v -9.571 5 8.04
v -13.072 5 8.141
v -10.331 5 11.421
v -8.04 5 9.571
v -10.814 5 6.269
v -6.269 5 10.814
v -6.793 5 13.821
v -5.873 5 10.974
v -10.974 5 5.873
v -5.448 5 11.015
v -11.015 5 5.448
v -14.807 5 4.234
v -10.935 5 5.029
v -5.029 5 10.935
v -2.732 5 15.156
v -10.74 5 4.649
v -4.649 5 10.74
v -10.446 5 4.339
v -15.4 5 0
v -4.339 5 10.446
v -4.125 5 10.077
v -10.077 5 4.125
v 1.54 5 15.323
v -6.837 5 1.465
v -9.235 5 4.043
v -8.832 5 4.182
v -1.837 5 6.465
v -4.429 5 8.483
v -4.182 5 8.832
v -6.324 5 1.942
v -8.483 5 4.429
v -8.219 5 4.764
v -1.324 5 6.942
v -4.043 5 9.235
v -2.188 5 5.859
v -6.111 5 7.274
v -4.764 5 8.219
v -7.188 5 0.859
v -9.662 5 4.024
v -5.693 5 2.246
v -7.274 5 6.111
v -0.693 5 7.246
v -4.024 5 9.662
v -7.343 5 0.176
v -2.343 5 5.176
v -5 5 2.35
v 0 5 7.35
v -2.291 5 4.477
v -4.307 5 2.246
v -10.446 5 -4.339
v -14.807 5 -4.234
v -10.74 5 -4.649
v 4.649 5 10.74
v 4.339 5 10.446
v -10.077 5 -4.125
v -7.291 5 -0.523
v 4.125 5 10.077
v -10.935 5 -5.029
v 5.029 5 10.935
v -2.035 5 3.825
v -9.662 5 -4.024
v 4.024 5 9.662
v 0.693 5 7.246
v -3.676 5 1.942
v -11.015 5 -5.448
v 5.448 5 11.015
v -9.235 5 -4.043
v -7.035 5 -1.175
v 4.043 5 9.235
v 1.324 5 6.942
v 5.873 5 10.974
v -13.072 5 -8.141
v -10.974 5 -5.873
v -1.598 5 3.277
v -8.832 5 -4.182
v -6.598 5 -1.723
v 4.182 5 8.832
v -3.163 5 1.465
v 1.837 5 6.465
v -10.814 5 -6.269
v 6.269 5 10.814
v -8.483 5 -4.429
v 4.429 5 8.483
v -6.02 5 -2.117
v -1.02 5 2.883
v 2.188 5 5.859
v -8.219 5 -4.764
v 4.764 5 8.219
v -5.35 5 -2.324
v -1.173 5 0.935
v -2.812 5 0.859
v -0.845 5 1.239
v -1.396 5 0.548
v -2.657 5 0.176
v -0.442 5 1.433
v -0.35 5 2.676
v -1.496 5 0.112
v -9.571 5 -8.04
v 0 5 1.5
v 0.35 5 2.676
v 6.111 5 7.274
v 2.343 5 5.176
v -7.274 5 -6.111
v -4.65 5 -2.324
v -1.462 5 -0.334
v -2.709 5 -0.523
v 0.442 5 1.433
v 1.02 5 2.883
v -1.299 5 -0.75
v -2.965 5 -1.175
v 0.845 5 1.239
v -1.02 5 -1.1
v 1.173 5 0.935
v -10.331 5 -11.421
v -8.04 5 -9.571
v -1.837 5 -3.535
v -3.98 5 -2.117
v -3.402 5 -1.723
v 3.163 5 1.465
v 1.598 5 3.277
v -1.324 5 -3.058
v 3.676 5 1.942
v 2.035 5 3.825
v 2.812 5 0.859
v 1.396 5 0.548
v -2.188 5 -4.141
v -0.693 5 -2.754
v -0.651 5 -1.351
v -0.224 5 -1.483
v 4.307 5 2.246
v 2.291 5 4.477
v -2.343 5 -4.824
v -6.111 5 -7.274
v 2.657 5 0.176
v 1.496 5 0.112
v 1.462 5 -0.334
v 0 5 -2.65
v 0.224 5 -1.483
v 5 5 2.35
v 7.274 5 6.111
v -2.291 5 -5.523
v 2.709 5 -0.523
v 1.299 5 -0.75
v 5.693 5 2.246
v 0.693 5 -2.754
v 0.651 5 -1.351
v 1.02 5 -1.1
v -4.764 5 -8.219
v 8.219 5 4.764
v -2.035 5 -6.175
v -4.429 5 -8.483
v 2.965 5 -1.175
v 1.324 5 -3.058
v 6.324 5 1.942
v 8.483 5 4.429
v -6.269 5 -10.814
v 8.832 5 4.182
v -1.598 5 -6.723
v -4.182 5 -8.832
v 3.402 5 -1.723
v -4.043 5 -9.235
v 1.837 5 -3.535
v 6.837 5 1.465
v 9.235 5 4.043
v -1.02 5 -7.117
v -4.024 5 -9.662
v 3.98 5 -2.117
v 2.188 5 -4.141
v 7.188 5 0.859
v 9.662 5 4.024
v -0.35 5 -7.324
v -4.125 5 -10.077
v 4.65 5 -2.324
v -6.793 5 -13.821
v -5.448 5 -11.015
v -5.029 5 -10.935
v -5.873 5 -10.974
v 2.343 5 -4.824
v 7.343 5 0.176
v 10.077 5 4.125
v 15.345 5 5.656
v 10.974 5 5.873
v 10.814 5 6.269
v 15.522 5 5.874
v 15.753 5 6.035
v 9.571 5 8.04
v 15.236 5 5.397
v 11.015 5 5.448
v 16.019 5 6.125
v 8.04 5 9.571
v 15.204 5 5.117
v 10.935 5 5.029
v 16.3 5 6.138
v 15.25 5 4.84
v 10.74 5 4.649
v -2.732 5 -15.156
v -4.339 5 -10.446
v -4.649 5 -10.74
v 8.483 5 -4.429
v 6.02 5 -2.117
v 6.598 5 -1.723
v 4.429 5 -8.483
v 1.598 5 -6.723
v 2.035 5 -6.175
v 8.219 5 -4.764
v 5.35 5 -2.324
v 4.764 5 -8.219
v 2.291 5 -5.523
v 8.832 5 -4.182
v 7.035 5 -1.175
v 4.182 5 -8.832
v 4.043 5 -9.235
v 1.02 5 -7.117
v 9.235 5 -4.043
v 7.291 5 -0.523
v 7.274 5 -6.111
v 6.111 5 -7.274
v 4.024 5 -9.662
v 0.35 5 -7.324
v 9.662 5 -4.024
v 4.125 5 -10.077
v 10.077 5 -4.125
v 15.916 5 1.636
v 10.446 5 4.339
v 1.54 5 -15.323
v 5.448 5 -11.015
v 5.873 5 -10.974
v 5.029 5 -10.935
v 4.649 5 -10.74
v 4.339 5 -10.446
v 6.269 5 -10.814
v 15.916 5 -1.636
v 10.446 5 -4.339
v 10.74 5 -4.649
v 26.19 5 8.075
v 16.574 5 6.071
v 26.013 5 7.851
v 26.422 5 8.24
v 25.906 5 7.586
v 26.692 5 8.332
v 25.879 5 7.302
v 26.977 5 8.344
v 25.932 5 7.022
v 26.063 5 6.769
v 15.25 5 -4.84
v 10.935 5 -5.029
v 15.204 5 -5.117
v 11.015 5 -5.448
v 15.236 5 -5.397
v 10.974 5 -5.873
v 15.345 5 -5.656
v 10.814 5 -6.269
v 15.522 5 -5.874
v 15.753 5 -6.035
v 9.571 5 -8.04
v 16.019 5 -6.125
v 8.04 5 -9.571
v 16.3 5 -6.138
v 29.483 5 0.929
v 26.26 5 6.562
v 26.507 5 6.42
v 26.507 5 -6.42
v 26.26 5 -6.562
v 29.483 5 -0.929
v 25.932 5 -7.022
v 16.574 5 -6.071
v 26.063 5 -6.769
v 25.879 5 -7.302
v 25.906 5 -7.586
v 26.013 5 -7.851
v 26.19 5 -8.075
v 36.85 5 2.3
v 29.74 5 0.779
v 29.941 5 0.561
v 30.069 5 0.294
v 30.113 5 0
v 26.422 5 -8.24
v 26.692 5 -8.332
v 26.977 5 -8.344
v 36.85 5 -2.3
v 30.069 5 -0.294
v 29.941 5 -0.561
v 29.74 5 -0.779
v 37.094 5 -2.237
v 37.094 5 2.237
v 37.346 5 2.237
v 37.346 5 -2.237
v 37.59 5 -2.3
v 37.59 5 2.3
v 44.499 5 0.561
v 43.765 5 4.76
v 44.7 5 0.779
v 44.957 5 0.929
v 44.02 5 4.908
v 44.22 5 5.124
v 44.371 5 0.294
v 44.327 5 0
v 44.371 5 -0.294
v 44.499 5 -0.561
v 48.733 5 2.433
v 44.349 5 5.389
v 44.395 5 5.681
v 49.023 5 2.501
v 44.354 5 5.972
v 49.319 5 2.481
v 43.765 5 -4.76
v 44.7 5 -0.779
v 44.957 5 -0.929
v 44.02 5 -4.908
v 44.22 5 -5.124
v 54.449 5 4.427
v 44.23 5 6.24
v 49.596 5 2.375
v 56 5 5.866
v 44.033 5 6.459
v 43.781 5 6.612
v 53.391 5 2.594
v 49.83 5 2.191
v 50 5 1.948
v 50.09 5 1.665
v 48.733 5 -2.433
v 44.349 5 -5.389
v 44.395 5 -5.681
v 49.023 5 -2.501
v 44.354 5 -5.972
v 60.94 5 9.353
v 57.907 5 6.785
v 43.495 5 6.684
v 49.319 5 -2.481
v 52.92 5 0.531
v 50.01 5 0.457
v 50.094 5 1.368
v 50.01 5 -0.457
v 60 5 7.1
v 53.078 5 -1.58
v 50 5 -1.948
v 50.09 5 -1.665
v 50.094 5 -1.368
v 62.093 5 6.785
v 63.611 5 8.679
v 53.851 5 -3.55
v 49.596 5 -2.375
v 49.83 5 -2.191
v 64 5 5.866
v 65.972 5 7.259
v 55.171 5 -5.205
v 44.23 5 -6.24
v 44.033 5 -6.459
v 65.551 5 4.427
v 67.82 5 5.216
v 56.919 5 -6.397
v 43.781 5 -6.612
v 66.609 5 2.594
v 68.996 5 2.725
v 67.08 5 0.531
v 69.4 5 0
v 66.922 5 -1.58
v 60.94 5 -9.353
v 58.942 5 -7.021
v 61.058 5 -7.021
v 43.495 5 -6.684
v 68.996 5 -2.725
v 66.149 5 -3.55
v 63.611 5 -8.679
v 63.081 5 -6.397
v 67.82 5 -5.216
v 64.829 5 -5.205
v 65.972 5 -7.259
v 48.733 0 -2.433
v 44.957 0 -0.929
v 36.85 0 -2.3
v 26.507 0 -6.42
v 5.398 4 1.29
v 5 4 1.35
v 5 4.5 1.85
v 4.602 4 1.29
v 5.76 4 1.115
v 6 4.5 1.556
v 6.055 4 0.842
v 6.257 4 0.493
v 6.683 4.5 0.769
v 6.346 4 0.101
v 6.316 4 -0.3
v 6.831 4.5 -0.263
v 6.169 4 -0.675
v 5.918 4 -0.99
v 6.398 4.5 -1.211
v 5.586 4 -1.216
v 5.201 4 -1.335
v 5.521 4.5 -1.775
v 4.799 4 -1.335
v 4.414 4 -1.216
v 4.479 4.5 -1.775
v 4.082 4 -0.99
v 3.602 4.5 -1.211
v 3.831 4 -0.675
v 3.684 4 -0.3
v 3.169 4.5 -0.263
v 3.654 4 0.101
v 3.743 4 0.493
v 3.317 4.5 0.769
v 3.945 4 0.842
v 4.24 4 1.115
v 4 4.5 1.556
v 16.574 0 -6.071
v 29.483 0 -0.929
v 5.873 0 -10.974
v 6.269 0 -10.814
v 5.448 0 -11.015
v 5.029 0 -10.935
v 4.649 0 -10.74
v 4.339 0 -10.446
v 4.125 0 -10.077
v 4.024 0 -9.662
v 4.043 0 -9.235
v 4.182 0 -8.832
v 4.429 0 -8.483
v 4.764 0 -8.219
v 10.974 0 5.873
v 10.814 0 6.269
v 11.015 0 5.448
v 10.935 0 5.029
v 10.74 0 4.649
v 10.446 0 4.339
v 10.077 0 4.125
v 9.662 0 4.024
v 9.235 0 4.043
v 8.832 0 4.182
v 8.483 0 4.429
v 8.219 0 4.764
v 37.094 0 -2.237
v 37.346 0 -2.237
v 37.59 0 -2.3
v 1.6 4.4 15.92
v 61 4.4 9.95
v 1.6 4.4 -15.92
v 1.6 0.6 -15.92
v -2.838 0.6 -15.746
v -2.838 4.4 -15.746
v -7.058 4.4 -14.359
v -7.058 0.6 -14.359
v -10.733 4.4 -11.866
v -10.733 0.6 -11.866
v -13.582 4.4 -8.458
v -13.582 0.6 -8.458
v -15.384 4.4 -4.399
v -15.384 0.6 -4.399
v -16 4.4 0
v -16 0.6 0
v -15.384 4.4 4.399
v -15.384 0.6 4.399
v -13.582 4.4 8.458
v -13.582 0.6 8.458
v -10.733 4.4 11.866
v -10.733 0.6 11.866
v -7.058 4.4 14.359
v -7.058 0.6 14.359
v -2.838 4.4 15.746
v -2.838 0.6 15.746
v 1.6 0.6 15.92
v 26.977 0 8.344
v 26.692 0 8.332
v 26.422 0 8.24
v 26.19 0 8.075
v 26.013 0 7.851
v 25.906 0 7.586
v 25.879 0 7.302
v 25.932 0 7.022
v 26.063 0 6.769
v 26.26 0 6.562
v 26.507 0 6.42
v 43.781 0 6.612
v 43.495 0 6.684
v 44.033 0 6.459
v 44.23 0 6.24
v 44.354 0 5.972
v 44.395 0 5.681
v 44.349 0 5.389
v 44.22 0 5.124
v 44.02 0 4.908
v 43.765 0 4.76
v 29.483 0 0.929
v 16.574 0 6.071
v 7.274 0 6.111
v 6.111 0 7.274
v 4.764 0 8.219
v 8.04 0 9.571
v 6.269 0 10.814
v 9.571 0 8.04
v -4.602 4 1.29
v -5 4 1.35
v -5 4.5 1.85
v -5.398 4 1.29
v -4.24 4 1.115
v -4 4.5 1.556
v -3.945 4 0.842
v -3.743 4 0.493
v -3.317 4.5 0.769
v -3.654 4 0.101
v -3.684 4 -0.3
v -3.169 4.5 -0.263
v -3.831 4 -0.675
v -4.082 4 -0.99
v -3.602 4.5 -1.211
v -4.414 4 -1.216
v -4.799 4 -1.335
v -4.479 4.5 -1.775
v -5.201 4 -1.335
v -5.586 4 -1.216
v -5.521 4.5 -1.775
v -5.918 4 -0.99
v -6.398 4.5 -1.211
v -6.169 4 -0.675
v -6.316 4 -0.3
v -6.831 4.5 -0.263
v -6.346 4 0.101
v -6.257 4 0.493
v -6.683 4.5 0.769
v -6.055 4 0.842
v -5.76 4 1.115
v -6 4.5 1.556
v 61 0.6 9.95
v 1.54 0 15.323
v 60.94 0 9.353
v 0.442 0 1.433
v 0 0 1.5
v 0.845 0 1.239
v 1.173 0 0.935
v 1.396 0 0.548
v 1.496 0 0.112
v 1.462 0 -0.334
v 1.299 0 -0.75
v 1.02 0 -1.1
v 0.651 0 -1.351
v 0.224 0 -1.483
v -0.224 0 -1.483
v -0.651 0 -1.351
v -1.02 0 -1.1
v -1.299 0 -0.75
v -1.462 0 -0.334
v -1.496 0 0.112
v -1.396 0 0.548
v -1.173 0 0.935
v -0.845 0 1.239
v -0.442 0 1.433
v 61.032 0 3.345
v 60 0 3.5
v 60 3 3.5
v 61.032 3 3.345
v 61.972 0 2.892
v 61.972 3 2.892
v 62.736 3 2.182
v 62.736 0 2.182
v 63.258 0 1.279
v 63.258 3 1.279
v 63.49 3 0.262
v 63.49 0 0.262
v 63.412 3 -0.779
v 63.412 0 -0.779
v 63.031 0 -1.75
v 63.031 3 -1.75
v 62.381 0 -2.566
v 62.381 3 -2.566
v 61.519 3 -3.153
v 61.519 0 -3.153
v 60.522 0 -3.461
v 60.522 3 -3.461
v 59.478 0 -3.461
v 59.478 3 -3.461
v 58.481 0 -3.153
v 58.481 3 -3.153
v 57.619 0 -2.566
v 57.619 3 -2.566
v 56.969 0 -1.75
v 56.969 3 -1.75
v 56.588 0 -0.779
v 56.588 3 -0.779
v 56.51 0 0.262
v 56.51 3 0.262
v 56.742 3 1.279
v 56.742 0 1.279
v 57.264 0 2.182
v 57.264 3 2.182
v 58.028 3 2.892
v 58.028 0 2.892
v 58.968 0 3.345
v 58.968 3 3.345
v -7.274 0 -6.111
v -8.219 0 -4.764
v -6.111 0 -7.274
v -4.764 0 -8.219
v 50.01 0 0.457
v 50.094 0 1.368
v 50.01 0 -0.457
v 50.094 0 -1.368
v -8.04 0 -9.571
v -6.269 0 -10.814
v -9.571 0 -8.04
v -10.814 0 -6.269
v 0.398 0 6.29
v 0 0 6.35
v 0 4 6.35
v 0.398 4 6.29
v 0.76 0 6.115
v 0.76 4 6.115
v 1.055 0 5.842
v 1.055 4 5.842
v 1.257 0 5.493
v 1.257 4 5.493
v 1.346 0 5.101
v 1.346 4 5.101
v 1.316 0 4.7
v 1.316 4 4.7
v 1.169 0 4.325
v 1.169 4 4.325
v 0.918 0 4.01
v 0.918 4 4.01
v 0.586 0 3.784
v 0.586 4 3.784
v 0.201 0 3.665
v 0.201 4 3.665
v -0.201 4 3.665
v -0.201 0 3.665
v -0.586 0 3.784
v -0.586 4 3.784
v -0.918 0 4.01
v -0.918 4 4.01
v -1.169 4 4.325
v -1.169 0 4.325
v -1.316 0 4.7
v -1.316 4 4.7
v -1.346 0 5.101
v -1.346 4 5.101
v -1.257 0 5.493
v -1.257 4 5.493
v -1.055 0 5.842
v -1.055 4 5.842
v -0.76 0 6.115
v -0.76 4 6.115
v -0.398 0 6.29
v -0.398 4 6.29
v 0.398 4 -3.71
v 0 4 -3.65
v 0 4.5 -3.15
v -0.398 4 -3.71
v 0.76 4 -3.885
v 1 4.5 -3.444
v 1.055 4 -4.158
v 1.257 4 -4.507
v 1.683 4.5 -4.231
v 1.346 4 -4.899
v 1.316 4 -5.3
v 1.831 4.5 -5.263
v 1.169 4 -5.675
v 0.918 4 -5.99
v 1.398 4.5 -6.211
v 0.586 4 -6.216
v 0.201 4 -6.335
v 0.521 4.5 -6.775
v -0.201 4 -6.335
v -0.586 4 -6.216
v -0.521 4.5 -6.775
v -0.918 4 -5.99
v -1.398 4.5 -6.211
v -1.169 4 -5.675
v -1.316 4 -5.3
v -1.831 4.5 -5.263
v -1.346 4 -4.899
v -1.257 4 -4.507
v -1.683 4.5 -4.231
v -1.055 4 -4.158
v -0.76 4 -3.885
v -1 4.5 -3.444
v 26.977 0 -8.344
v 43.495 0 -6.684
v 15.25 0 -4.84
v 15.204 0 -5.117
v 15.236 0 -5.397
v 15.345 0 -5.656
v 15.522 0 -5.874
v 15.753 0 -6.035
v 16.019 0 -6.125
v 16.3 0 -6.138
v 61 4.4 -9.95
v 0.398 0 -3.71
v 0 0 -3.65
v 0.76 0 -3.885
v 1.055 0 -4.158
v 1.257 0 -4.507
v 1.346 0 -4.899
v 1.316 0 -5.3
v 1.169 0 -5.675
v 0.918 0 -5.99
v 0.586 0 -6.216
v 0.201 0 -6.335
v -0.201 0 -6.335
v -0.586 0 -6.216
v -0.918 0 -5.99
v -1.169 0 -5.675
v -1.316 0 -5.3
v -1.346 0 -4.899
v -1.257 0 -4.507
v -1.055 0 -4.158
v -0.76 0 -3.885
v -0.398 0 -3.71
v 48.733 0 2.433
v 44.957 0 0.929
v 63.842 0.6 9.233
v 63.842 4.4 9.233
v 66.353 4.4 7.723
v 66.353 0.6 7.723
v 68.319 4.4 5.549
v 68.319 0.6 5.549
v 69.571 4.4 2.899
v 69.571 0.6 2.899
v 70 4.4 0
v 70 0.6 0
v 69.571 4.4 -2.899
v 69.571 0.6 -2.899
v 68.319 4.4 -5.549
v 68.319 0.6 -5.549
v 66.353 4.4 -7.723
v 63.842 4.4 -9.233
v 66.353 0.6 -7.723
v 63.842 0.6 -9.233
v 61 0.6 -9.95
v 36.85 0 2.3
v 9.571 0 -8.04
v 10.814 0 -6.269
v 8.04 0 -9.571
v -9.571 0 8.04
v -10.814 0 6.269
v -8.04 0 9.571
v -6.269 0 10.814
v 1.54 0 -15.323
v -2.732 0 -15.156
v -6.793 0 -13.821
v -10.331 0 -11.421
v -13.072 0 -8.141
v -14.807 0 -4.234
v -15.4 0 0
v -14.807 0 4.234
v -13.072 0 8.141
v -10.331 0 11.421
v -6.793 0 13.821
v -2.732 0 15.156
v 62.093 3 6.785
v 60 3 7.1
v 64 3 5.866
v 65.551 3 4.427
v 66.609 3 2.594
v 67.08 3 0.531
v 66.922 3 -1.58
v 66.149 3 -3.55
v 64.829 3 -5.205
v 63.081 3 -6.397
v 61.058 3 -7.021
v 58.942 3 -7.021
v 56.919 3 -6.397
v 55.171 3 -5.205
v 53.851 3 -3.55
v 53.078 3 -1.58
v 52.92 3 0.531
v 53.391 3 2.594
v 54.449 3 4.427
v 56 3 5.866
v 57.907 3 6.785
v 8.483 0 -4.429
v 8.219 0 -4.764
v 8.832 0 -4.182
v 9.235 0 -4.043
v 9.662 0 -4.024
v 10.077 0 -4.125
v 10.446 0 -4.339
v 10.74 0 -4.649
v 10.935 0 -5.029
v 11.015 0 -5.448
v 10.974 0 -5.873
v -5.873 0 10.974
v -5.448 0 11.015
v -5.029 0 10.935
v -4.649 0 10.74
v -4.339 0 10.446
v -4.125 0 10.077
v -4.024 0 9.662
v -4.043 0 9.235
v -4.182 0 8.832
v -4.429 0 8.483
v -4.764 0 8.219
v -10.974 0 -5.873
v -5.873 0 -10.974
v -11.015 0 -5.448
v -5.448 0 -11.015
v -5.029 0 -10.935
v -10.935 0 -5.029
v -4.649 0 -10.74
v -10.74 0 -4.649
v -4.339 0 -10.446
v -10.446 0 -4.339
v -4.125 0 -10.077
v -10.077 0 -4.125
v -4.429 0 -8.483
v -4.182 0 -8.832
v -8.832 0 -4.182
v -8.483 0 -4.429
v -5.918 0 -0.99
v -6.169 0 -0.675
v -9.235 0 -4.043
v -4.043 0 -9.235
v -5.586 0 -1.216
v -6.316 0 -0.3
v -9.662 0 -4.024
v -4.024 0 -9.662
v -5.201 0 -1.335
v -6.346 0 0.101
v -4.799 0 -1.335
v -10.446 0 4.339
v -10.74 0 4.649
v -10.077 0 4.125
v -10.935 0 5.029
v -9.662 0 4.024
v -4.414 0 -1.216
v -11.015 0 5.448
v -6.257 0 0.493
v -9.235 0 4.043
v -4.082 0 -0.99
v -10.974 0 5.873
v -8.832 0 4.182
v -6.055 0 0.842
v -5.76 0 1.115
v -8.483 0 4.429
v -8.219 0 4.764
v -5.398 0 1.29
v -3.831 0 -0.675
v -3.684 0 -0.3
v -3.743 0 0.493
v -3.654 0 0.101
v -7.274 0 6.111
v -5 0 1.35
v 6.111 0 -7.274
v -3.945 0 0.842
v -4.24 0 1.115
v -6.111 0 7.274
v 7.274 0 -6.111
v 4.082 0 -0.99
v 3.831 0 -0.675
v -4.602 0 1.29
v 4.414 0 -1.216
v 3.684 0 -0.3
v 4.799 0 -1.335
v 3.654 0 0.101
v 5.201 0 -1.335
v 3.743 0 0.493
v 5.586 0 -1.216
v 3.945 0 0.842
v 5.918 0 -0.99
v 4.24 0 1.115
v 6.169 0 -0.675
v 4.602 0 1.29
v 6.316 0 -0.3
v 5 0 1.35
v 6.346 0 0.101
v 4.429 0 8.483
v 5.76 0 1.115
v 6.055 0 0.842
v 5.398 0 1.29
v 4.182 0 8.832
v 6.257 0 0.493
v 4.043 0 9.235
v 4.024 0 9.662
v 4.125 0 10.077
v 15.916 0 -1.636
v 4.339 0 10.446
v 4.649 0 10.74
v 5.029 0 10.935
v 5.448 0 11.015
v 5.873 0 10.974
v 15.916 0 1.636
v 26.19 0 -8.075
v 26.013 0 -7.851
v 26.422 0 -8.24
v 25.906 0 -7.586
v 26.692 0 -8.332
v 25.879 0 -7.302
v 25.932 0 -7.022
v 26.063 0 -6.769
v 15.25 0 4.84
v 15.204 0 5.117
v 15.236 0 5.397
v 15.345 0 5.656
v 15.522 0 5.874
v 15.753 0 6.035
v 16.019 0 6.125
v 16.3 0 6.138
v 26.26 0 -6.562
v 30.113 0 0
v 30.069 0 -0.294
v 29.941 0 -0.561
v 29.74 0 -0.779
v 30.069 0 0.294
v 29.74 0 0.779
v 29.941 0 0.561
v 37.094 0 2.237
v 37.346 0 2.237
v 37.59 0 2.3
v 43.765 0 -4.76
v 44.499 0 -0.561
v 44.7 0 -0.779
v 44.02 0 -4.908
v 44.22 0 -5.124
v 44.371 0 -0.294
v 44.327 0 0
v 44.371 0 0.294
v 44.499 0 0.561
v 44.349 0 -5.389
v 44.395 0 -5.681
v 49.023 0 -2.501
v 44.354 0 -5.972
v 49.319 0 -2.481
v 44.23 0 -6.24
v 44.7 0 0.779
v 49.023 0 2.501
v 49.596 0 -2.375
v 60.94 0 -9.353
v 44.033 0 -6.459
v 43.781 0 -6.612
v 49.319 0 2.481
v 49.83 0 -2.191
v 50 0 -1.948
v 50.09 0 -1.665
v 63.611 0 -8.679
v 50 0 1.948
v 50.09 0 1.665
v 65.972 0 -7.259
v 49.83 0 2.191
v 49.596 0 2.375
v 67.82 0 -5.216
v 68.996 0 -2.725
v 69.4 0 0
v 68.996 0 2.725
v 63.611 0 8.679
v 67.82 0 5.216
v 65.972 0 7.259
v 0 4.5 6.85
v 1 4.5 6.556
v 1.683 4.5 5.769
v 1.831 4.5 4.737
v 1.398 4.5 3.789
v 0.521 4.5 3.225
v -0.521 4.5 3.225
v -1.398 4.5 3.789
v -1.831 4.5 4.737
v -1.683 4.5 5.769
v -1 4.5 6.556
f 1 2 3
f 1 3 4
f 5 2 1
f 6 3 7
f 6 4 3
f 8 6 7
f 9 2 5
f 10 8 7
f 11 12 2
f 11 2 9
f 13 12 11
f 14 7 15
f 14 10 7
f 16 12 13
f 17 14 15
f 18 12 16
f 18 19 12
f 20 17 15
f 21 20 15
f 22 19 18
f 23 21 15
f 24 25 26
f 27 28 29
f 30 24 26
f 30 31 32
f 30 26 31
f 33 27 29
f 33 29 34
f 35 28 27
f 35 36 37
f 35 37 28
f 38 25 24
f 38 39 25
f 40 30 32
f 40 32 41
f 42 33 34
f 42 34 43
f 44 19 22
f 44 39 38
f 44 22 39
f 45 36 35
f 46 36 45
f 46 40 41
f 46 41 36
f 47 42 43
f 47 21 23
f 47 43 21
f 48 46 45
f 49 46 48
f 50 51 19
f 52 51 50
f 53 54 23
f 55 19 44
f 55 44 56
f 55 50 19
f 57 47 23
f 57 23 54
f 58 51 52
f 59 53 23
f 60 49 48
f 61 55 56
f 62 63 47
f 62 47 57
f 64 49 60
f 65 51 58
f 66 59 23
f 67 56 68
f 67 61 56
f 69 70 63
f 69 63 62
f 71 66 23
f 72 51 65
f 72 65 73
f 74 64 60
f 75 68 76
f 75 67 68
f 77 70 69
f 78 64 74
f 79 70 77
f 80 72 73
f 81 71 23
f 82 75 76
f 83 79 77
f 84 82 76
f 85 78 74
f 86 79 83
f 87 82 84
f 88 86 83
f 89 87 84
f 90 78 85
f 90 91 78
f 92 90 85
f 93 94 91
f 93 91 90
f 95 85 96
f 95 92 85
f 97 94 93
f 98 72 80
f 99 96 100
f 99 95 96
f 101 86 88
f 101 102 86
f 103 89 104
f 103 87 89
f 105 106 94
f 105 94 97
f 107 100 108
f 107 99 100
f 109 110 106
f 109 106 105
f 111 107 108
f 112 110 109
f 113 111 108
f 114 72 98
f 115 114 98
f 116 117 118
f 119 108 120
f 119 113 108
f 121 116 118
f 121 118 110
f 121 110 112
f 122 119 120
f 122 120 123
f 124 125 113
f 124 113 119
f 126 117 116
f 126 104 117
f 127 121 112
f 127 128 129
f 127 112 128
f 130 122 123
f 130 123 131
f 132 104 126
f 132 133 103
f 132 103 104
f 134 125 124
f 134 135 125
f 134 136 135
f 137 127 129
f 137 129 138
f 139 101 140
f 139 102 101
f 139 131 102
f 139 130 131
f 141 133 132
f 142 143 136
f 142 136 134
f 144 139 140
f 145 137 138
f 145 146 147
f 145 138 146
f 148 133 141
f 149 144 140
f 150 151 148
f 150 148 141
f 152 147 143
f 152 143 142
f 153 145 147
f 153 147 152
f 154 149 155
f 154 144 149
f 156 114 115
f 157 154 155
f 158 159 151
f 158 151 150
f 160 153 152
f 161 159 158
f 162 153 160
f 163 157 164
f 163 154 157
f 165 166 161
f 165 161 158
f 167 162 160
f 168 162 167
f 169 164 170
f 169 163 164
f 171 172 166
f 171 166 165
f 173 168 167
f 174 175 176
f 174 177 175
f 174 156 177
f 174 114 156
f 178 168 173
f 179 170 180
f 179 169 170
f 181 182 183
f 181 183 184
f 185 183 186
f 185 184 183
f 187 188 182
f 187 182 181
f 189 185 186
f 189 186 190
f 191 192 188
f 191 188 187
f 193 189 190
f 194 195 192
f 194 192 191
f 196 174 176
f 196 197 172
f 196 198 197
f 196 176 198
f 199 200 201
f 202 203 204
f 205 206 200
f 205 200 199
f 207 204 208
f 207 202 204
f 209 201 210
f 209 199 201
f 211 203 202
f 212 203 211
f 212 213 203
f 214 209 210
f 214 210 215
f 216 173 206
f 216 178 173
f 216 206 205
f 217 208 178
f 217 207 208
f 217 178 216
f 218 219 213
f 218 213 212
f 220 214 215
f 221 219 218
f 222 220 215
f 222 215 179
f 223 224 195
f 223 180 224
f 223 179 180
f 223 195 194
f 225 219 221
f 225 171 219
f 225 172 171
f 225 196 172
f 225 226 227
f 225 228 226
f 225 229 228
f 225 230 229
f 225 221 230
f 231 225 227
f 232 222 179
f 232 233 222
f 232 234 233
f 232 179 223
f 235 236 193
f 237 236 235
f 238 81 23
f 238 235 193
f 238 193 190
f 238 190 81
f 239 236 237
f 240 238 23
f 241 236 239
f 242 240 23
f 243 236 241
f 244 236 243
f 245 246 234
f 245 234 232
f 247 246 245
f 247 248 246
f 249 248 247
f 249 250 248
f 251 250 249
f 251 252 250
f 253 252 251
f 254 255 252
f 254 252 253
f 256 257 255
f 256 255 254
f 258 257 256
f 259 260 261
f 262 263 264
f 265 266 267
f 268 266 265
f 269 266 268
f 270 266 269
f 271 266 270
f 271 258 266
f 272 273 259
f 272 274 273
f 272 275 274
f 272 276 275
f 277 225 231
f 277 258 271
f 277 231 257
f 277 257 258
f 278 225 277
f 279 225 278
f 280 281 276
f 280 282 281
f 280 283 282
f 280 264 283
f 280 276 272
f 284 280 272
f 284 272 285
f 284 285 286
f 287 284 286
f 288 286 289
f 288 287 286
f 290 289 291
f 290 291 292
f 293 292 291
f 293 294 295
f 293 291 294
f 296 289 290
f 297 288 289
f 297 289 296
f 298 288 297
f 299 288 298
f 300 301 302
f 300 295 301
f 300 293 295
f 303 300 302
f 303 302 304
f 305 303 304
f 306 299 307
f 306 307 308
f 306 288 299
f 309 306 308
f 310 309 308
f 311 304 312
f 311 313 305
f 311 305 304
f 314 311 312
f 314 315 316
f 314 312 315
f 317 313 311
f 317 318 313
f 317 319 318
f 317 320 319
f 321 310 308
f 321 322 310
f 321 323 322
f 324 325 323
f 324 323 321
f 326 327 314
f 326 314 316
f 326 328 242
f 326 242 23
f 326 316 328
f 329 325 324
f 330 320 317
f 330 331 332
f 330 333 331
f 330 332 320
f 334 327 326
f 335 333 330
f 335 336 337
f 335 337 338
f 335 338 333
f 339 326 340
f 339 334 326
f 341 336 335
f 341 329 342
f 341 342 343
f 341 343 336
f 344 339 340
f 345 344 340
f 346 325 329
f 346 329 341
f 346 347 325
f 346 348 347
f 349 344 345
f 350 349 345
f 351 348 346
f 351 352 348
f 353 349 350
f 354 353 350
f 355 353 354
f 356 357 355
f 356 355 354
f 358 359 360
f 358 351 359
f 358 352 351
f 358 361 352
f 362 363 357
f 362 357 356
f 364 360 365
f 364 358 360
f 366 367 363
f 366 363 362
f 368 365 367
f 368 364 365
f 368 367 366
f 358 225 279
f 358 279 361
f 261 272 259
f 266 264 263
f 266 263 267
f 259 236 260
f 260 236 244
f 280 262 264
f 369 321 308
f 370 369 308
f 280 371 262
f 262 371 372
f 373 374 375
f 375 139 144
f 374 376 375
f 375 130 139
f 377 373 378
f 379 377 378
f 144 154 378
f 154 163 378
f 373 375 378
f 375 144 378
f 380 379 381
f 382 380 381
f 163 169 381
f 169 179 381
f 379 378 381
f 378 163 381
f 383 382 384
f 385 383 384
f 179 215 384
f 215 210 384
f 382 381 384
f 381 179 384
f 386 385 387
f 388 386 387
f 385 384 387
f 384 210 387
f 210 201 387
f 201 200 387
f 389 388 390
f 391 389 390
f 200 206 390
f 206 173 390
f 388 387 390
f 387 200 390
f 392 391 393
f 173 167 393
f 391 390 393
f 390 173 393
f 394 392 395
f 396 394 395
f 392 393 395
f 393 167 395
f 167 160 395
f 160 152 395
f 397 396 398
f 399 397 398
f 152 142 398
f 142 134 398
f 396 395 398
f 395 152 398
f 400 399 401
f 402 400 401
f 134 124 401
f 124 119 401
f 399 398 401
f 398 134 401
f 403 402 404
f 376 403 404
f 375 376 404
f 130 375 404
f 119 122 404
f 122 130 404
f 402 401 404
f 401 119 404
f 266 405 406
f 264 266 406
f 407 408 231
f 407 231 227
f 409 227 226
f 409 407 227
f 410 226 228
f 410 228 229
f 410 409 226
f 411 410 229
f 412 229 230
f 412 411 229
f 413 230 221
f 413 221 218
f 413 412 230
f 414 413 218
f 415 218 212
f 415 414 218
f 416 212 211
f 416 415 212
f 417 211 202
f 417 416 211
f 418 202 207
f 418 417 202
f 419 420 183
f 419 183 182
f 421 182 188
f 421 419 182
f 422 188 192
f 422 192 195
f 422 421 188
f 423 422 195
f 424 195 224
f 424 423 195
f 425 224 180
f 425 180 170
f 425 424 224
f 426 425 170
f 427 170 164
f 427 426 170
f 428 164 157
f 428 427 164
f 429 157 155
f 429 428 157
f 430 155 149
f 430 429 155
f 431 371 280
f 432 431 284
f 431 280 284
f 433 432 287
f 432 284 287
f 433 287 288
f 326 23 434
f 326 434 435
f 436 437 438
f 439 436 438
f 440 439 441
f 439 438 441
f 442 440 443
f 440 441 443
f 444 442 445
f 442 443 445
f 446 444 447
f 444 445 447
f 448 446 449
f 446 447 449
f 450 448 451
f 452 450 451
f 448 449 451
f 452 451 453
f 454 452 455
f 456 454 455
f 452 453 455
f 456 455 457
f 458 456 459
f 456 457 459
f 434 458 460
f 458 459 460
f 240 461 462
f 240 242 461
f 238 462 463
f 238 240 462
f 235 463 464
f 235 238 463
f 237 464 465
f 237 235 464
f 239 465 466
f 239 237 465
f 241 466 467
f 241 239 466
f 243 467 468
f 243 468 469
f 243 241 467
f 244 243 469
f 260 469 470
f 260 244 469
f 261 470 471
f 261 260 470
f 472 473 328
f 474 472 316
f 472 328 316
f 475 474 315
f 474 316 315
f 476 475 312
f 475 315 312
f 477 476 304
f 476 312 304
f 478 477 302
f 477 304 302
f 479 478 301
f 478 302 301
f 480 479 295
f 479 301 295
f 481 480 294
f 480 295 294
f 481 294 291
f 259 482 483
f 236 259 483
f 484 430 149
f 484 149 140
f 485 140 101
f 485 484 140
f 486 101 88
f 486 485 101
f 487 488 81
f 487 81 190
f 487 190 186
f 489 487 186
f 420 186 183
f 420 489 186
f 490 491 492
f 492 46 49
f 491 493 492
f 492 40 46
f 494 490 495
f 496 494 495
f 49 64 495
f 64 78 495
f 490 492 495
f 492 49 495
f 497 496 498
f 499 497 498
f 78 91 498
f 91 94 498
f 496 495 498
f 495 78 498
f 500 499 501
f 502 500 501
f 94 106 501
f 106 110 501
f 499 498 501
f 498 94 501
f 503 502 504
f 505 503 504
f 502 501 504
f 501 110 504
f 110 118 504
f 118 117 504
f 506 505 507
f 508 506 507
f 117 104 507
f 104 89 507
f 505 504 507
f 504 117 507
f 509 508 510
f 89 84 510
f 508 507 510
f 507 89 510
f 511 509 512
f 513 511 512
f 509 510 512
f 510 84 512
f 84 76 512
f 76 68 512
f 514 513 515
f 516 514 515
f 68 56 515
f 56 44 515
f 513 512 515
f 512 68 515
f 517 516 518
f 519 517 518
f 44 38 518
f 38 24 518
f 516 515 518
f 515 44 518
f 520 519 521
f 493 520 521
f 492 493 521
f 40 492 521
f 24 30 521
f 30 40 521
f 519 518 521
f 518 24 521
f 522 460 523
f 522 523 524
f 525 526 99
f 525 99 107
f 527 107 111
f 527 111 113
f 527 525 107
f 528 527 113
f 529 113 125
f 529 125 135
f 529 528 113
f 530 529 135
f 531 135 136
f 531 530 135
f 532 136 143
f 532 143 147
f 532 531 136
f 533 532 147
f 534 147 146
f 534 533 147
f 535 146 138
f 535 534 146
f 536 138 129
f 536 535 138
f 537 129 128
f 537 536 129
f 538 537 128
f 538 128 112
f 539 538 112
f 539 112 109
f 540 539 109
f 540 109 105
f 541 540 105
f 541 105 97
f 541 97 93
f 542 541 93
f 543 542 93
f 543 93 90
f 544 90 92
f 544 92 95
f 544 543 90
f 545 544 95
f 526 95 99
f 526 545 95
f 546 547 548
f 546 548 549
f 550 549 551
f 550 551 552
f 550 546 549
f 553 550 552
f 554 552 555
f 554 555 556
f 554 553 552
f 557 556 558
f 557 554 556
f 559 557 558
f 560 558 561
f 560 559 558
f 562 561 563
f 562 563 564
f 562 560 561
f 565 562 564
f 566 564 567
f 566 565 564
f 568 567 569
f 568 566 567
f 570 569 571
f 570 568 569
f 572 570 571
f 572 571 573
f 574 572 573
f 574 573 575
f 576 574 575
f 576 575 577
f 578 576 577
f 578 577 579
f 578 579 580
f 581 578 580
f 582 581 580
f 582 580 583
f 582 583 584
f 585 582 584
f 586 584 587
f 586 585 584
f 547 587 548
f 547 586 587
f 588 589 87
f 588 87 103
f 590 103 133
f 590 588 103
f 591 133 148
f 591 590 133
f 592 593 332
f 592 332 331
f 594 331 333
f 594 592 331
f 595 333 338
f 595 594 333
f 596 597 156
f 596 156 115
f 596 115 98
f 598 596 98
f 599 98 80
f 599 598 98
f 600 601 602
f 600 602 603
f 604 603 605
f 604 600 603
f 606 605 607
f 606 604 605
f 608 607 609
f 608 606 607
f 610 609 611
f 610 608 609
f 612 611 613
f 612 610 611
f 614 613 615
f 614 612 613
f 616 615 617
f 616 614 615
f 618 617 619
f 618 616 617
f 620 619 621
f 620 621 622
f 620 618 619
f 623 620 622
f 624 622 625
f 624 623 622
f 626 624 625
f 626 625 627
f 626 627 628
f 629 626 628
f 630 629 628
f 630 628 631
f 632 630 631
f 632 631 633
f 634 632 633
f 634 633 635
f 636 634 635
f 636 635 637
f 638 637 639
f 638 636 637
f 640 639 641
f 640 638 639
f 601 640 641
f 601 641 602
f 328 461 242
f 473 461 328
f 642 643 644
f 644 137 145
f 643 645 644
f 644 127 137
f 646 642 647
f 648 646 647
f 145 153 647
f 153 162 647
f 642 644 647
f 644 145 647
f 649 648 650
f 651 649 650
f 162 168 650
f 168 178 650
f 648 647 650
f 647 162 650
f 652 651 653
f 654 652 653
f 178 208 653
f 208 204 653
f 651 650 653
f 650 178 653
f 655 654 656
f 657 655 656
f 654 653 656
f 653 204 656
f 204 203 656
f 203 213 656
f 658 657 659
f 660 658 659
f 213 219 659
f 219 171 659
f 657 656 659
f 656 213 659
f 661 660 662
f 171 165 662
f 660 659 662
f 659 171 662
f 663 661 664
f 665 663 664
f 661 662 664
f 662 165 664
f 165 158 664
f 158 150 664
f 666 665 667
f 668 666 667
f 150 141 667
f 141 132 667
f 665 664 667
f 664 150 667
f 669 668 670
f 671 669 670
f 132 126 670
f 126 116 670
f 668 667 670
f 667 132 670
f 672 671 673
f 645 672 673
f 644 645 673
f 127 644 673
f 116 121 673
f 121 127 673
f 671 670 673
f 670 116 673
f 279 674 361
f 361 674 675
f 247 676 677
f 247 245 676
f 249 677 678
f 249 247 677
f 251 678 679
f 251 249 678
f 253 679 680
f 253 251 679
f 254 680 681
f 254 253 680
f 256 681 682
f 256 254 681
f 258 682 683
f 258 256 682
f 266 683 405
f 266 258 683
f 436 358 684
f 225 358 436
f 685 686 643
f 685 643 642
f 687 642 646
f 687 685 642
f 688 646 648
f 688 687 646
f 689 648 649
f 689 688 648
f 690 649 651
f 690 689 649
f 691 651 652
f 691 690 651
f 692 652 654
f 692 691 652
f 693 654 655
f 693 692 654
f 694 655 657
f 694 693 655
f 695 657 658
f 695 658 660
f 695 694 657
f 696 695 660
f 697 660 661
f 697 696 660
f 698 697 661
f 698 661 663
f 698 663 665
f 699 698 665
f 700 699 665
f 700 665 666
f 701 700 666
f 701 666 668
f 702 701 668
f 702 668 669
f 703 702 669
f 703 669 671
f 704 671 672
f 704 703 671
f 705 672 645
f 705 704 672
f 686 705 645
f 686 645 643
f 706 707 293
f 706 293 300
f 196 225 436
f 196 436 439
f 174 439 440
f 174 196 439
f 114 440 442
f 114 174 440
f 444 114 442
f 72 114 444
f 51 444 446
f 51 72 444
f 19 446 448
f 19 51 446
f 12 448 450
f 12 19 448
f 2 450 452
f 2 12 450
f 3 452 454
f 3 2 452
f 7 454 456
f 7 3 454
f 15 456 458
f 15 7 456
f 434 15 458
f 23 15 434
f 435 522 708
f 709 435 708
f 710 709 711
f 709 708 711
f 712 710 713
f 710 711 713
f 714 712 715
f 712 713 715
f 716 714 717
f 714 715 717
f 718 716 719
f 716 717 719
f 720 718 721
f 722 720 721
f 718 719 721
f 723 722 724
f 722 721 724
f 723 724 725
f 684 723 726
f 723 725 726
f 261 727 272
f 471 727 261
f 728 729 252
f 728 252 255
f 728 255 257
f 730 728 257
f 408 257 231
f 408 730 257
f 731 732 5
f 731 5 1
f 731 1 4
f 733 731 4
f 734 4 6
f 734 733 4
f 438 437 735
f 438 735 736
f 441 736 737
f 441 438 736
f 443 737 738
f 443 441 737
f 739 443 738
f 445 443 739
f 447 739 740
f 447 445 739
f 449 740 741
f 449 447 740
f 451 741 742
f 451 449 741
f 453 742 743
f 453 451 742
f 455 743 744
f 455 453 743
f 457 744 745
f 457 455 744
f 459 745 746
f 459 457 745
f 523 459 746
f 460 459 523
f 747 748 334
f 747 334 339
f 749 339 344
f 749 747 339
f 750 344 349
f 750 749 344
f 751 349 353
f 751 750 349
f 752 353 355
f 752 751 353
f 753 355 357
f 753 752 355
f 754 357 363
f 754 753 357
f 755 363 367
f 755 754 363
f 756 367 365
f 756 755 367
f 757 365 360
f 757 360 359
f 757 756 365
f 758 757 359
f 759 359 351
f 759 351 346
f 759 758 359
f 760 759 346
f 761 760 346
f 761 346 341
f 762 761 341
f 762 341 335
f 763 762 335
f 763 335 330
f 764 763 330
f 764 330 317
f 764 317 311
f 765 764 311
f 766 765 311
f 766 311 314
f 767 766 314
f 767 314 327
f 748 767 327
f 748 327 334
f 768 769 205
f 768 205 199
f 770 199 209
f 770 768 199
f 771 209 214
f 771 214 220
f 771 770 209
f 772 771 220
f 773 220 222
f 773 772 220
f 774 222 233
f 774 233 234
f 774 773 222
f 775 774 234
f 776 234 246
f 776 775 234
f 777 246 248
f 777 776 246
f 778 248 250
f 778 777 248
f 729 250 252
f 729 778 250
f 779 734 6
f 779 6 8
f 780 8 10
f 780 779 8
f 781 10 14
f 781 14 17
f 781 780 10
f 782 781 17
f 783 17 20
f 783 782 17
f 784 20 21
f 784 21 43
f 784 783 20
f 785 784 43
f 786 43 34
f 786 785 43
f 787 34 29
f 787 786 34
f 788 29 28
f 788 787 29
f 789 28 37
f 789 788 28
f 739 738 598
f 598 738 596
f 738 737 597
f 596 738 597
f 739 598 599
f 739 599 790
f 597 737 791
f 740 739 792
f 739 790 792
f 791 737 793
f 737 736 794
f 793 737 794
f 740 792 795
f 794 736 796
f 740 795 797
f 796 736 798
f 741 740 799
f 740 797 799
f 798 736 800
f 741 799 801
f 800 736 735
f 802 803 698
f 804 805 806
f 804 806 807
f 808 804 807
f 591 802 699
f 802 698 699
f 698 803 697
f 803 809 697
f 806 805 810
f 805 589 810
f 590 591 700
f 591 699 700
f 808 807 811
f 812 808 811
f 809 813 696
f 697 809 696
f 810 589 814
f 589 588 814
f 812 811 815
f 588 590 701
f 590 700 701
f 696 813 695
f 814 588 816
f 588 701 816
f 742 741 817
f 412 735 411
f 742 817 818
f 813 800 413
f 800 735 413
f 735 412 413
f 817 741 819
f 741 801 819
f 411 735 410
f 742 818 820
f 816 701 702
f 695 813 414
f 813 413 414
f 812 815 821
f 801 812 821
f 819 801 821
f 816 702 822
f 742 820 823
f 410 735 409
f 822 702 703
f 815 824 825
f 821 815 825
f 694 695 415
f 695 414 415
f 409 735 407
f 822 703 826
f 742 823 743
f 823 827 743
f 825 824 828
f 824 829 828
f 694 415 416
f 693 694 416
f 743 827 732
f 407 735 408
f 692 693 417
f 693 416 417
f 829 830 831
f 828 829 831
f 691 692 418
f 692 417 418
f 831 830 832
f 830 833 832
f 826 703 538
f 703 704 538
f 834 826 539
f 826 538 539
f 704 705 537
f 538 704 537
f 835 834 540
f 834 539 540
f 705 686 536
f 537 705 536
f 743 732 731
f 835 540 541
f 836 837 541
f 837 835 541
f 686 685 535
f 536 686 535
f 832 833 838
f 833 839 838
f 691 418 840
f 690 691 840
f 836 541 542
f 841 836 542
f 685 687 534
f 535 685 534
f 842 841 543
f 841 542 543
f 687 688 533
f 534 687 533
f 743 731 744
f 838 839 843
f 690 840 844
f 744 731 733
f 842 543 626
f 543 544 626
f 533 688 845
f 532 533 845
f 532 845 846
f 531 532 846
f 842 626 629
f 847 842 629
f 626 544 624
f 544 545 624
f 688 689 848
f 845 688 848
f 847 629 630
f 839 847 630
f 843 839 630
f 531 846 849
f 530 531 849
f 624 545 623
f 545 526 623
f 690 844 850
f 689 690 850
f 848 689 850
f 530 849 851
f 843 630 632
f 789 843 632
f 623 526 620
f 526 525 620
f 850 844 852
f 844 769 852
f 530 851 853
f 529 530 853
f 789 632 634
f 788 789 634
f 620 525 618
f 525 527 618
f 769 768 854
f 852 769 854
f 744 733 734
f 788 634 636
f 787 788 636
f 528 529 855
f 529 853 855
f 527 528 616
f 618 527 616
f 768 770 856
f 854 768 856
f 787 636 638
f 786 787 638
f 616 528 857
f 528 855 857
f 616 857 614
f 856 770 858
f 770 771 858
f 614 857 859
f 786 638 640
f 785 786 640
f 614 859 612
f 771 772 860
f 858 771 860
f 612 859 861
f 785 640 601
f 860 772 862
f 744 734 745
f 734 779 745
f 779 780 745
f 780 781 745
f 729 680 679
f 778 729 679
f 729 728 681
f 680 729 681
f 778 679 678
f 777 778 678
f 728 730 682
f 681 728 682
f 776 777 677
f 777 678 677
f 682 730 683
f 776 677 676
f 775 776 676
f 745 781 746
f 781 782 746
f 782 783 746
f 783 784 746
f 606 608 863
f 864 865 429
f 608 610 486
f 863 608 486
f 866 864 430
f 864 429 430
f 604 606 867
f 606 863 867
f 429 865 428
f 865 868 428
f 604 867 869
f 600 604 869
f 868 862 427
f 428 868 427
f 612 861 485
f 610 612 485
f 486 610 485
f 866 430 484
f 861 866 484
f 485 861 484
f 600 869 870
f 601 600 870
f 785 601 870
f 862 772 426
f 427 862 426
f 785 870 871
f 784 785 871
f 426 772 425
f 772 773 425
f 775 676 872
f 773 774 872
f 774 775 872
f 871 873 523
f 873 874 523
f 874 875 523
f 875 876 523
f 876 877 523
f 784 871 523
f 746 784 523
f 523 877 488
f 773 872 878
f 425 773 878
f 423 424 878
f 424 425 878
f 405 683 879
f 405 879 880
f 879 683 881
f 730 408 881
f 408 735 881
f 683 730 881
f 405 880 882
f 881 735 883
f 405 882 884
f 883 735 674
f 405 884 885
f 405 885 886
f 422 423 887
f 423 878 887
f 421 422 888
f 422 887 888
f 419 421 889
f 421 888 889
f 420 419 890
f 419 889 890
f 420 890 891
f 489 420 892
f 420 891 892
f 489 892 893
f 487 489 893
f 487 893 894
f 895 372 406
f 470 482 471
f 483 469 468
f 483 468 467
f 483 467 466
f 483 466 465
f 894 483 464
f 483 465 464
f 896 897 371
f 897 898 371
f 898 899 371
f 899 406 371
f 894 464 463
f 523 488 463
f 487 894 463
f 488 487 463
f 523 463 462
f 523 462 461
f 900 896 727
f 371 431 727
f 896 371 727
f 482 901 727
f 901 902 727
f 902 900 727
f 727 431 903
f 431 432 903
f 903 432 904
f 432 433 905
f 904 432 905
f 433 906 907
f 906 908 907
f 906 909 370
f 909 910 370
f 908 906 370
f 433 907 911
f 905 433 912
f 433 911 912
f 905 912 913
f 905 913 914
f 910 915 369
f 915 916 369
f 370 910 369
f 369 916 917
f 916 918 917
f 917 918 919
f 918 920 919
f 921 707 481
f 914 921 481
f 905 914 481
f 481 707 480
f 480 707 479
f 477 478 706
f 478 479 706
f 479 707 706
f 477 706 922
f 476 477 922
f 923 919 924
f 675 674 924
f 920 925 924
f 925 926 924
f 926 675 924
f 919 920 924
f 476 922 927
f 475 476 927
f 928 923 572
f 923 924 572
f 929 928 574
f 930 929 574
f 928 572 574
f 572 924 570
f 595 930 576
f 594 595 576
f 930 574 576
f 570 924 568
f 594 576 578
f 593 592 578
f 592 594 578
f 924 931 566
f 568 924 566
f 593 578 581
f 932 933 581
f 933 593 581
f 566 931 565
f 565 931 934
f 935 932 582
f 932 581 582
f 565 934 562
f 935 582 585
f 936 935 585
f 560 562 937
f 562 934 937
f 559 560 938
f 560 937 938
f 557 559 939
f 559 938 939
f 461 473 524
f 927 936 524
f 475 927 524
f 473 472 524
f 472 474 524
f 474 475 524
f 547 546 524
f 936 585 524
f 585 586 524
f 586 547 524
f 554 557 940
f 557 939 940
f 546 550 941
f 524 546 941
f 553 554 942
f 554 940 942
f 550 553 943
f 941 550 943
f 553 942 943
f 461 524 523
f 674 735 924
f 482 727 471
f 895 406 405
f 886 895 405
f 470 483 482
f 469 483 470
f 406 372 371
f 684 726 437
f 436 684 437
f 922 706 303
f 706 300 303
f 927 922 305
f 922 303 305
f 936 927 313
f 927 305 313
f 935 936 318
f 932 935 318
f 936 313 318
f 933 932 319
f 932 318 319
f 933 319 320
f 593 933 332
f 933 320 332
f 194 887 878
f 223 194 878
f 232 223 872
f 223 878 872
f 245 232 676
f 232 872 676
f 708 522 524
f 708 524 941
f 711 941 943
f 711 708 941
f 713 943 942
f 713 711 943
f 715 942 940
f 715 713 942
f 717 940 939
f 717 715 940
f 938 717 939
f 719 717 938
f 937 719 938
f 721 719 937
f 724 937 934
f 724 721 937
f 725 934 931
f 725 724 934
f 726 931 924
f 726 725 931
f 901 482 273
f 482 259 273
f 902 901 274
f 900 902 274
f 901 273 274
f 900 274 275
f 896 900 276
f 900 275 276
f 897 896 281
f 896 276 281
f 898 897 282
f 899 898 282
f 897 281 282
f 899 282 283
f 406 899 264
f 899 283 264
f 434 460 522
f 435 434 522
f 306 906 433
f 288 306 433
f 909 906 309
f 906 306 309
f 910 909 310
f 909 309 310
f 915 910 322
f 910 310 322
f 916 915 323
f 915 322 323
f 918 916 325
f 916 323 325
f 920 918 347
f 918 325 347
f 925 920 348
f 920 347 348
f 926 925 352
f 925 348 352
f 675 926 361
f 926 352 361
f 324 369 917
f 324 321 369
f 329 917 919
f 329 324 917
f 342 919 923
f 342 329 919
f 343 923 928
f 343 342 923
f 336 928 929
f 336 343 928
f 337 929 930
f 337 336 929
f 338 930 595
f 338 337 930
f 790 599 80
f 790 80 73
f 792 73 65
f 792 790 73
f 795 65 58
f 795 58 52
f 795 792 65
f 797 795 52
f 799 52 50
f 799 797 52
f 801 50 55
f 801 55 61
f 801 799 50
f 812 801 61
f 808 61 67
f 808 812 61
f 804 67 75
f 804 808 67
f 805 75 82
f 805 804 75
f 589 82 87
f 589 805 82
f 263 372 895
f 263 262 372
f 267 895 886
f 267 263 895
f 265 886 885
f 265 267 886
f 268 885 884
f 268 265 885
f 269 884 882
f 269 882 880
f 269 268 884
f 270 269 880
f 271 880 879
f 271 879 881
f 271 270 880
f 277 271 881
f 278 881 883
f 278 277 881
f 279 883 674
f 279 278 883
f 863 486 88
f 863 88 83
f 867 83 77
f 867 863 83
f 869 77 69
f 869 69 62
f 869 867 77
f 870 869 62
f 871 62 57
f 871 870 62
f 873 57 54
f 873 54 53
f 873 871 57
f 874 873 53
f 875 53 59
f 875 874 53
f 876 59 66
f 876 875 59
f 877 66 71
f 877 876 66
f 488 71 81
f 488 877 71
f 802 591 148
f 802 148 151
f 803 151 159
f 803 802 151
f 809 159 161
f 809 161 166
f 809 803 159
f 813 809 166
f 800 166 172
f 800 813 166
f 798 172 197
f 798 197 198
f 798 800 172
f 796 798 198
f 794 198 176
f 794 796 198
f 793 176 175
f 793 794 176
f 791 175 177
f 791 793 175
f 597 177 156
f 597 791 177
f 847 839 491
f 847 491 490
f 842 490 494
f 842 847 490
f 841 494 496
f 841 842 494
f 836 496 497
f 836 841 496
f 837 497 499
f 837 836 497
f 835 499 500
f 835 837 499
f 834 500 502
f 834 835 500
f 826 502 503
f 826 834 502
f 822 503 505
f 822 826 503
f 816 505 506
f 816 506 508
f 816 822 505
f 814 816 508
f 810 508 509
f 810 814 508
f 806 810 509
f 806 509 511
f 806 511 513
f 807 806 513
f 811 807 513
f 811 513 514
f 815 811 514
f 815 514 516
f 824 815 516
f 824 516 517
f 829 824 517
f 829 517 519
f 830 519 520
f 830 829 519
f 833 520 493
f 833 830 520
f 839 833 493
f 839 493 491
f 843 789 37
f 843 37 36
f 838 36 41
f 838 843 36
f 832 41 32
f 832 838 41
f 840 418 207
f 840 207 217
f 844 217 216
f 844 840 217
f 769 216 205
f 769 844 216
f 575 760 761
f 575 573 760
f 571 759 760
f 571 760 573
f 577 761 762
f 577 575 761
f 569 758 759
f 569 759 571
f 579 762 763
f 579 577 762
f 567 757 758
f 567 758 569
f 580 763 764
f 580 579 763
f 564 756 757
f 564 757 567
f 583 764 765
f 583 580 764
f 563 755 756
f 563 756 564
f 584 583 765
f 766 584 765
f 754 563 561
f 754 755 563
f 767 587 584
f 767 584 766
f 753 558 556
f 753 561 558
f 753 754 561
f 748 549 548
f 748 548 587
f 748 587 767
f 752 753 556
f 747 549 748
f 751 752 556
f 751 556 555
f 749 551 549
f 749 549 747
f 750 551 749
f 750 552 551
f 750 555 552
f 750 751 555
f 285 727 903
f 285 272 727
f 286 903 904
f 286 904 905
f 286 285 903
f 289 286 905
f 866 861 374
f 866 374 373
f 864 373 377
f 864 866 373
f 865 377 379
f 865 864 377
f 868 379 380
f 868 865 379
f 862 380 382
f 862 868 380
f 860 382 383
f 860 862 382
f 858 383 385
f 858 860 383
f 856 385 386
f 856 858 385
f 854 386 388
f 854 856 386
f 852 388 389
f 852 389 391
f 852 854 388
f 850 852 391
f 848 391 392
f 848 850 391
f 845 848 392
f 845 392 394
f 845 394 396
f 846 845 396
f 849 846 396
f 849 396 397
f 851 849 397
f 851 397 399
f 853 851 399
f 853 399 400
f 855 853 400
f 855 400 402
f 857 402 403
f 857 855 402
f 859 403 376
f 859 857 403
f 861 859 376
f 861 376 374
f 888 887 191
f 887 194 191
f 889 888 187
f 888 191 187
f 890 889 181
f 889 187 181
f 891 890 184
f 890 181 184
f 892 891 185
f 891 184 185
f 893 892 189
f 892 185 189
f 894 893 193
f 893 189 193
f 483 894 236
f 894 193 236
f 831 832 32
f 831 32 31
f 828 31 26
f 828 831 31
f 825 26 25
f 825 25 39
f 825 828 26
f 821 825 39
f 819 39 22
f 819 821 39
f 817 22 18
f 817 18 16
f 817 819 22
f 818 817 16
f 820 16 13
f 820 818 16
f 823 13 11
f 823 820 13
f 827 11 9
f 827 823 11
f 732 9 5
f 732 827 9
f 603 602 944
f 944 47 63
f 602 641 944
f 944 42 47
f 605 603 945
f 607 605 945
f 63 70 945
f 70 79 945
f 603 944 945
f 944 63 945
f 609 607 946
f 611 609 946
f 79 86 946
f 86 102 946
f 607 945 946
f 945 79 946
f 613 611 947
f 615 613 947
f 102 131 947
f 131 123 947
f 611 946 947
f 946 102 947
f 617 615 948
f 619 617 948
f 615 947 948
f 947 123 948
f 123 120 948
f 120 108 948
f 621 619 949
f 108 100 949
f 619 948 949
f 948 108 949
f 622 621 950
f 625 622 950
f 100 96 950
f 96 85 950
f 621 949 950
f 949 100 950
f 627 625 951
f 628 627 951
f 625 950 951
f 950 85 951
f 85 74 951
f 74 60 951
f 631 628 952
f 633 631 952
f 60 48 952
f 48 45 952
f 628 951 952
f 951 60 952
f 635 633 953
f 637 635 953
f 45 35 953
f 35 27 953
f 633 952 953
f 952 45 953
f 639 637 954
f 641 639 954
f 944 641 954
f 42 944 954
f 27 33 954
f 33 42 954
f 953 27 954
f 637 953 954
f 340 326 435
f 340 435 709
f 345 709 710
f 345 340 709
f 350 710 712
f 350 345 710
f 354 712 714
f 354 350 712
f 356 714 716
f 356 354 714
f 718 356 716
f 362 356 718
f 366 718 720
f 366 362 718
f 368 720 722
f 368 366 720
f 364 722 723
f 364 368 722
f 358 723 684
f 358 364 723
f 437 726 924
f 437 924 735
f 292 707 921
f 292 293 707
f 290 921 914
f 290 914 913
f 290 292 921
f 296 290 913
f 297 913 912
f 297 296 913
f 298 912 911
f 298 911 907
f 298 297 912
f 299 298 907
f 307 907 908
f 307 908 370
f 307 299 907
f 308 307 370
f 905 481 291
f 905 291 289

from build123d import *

# Parameters (mm, degrees)
SKETCH_1_R      = 1.35
SKETCH_1_R_2    = 1.5
SKETCH_1_R_3    = 7.1
EXTRUDE_1_DEPTH = 5
SKETCH_1_3_R    = 7.1
SKETCH_1_3_R_2  = 3.5
EXTRUDE_2_DEPTH = 3
FILLET_1_R      = 1
CHAMFER_1_SIZE  = 0.6
CHAMFER_2_SIZE  = 1


with BuildPart() as part:
    # 草图1 → 凸台-拉伸1 (new body)
    with BuildSketch(Plane(origin=(0, 0, 0), x_dir=(1, 0, 0), z_dir=(0, 1, 0))):
        with BuildLine():
            ThreePointArc((1.6, 15.919798994), (-16, 0), (1.6, -15.919798994))
            Line((1.6, -15.919798994), (61, -9.949874371))
            ThreePointArc((61, -9.949874371), (70, 0), (61, 9.949874371))
            Line((61, 9.949874371), (1.6, 15.919798994))
        make_face()
        with BuildLine():
            ThreePointArc((-6.268918397, -10.814372942), (-8.838834765, -8.838834765), (-10.814372942, -6.268918397))
            ThreePointArc((-10.814372942, -6.268918397), (-10.268918397, -4.218923436), (-8.218923436, -4.764377982))
            ThreePointArc((-8.218923436, -4.764377982), (-6.717514421, -6.717514421), (-4.764377982, -8.218923436))
            ThreePointArc((-4.764377982, -8.218923436), (-4.218923436, -10.268918397), (-6.268918397, -10.814372942))
        make_face(mode=Mode.SUBTRACT)
        with Locations((0, -5)):
            Circle(SKETCH_1_R, mode=Mode.SUBTRACT)
        with BuildLine():
            ThreePointArc((10.814372942, -6.268918397), (8.838834765, -8.838834765), (6.268918397, -10.814372942))
            ThreePointArc((6.268918397, -10.814372942), (4.218923436, -10.268918397), (4.764377982, -8.218923436))
            ThreePointArc((4.764377982, -8.218923436), (6.717514421, -6.717514421), (8.218923436, -4.764377982))
            ThreePointArc((8.218923436, -4.764377982), (10.268918397, -4.218923436), (10.814372942, -6.268918397))
        make_face(mode=Mode.SUBTRACT)
        with BuildLine():
            ThreePointArc((14.422056339, -6.928512895), (16, 0), (14.422056339, 6.928512895))
            Line((14.422056339, 6.928512895), (31.815454695, 0))
            Line((31.815454695, 0), (14.422056339, -6.928512895))
        make_face(mode=Mode.SUBTRACT)
        Polygon((47.567517096, -6.274700622), (19.888927579, -9.056503536), (37.219953316, -2.152836244), align=None, mode=Mode.SUBTRACT)
        with Locations((-5, 0)):
            Circle(SKETCH_1_R, mode=Mode.SUBTRACT)
        Circle(SKETCH_1_R_2, mode=Mode.SUBTRACT)
        with Locations((5, 0)):
            Circle(SKETCH_1_R, mode=Mode.SUBTRACT)
        with BuildLine():
            ThreePointArc((-10.814372942, 6.268918397), (-8.838834765, 8.838834765), (-6.268918397, 10.814372942))
            ThreePointArc((-6.268918397, 10.814372942), (-4.218923436, 10.268918397), (-4.764377982, 8.218923436))
            ThreePointArc((-4.764377982, 8.218923436), (-6.717514421, 6.717514421), (-8.218923436, 4.764377982))
            ThreePointArc((-8.218923436, 4.764377982), (-10.268918397, 4.218923436), (-10.814372942, 6.268918397))
        make_face(mode=Mode.SUBTRACT)
        with Locations((0, 5)):
            Circle(SKETCH_1_R, mode=Mode.SUBTRACT)
        with BuildLine():
            ThreePointArc((6.268918397, 10.814372942), (8.838834765, 8.838834765), (10.814372942, 6.268918397))
            ThreePointArc((10.814372942, 6.268918397), (10.268918397, 4.218923436), (8.218923436, 4.764377982))
            ThreePointArc((8.218923436, 4.764377982), (6.717514421, 6.717514421), (4.764377982, 8.218923436))
            ThreePointArc((4.764377982, 8.218923436), (4.218923436, 10.268918397), (6.268918397, 10.814372942))
        make_face(mode=Mode.SUBTRACT)
        with BuildLine():
            Line((50.505563121, -3.139373879), (42.624451937, 0))
            Line((42.624451937, 0), (50.505563121, 3.139373879))
            ThreePointArc((50.505563121, 3.139373879), (50, 0), (50.505563121, -3.139373879))
        make_face(mode=Mode.SUBTRACT)
        Polygon((37.219953316, 2.152836244), (19.888927579, 9.056503536), (47.567517096, 6.274700622), align=None, mode=Mode.SUBTRACT)
        with Locations((60, 0)):
            Circle(SKETCH_1_R_3, mode=Mode.SUBTRACT)
    extrude(amount=EXTRUDE_1_DEPTH)

    # 草图1<3> → 凸台-拉伸2 (add)
    with BuildSketch(Plane(origin=(0, 0, 0), x_dir=(1, 0, 0), z_dir=(0, 1, 0))):
        with Locations((60, 0)):
            Circle(SKETCH_1_3_R)
        with Locations((60, 0)):
            Circle(SKETCH_1_3_R_2, mode=Mode.SUBTRACT)
    extrude(amount=EXTRUDE_2_DEPTH)

    # 圆角1
    fillet_1_edges = [part.edges().sort_by_distance(p)[0] for p in [
        (42.624451937, 2.5, 0),
        (50.505563121, 2.5, -3.139373879),
        (50.505563121, 2.5, 3.139373879),
        (47.567517096, 2.5, -6.274700622),
        (19.888927579, 2.5, -9.056503536),
        (37.219953316, 2.5, -2.152836244),
        (31.815454695, 2.5, 0),
        (14.422056339, 2.5, -6.928512895),
        (14.422056339, 2.5, 6.928512895),
        (19.888927579, 2.5, 9.056503536),
        (37.219953316, 2.5, 2.152836244),
        (47.567517096, 2.5, 6.274700622),
    ]]
    fillet(fillet_1_edges, radius=FILLET_1_R)

    # 倒角1
    chamfer_1_edges = [part.edges().sort_by_distance(p)[0] for p in [
        (31.3, 5, 12.934836682),
        (-16, 5, 0),
        (70, 5, 0),
        (31.3, 5, -12.934836682),
        (31.3, 0, 12.934836682),
        (-16, 0, 0),
        (70, 0, 0),
        (31.3, 0, -12.934836682),
    ]]
    chamfer(chamfer_1_edges, length=CHAMFER_1_SIZE)

    # 倒角2
    chamfer_2_edges = [part.edges().sort_by_distance(p)[0] for p in [
        (-6.35, 5, 0),
        (-1.35, 5, 5),
        (3.65, 5, 0),
        (-1.35, 5, -5),
    ]]
    chamfer(chamfer_2_edges, length=CHAMFER_2_SIZE)


solid = part.part
